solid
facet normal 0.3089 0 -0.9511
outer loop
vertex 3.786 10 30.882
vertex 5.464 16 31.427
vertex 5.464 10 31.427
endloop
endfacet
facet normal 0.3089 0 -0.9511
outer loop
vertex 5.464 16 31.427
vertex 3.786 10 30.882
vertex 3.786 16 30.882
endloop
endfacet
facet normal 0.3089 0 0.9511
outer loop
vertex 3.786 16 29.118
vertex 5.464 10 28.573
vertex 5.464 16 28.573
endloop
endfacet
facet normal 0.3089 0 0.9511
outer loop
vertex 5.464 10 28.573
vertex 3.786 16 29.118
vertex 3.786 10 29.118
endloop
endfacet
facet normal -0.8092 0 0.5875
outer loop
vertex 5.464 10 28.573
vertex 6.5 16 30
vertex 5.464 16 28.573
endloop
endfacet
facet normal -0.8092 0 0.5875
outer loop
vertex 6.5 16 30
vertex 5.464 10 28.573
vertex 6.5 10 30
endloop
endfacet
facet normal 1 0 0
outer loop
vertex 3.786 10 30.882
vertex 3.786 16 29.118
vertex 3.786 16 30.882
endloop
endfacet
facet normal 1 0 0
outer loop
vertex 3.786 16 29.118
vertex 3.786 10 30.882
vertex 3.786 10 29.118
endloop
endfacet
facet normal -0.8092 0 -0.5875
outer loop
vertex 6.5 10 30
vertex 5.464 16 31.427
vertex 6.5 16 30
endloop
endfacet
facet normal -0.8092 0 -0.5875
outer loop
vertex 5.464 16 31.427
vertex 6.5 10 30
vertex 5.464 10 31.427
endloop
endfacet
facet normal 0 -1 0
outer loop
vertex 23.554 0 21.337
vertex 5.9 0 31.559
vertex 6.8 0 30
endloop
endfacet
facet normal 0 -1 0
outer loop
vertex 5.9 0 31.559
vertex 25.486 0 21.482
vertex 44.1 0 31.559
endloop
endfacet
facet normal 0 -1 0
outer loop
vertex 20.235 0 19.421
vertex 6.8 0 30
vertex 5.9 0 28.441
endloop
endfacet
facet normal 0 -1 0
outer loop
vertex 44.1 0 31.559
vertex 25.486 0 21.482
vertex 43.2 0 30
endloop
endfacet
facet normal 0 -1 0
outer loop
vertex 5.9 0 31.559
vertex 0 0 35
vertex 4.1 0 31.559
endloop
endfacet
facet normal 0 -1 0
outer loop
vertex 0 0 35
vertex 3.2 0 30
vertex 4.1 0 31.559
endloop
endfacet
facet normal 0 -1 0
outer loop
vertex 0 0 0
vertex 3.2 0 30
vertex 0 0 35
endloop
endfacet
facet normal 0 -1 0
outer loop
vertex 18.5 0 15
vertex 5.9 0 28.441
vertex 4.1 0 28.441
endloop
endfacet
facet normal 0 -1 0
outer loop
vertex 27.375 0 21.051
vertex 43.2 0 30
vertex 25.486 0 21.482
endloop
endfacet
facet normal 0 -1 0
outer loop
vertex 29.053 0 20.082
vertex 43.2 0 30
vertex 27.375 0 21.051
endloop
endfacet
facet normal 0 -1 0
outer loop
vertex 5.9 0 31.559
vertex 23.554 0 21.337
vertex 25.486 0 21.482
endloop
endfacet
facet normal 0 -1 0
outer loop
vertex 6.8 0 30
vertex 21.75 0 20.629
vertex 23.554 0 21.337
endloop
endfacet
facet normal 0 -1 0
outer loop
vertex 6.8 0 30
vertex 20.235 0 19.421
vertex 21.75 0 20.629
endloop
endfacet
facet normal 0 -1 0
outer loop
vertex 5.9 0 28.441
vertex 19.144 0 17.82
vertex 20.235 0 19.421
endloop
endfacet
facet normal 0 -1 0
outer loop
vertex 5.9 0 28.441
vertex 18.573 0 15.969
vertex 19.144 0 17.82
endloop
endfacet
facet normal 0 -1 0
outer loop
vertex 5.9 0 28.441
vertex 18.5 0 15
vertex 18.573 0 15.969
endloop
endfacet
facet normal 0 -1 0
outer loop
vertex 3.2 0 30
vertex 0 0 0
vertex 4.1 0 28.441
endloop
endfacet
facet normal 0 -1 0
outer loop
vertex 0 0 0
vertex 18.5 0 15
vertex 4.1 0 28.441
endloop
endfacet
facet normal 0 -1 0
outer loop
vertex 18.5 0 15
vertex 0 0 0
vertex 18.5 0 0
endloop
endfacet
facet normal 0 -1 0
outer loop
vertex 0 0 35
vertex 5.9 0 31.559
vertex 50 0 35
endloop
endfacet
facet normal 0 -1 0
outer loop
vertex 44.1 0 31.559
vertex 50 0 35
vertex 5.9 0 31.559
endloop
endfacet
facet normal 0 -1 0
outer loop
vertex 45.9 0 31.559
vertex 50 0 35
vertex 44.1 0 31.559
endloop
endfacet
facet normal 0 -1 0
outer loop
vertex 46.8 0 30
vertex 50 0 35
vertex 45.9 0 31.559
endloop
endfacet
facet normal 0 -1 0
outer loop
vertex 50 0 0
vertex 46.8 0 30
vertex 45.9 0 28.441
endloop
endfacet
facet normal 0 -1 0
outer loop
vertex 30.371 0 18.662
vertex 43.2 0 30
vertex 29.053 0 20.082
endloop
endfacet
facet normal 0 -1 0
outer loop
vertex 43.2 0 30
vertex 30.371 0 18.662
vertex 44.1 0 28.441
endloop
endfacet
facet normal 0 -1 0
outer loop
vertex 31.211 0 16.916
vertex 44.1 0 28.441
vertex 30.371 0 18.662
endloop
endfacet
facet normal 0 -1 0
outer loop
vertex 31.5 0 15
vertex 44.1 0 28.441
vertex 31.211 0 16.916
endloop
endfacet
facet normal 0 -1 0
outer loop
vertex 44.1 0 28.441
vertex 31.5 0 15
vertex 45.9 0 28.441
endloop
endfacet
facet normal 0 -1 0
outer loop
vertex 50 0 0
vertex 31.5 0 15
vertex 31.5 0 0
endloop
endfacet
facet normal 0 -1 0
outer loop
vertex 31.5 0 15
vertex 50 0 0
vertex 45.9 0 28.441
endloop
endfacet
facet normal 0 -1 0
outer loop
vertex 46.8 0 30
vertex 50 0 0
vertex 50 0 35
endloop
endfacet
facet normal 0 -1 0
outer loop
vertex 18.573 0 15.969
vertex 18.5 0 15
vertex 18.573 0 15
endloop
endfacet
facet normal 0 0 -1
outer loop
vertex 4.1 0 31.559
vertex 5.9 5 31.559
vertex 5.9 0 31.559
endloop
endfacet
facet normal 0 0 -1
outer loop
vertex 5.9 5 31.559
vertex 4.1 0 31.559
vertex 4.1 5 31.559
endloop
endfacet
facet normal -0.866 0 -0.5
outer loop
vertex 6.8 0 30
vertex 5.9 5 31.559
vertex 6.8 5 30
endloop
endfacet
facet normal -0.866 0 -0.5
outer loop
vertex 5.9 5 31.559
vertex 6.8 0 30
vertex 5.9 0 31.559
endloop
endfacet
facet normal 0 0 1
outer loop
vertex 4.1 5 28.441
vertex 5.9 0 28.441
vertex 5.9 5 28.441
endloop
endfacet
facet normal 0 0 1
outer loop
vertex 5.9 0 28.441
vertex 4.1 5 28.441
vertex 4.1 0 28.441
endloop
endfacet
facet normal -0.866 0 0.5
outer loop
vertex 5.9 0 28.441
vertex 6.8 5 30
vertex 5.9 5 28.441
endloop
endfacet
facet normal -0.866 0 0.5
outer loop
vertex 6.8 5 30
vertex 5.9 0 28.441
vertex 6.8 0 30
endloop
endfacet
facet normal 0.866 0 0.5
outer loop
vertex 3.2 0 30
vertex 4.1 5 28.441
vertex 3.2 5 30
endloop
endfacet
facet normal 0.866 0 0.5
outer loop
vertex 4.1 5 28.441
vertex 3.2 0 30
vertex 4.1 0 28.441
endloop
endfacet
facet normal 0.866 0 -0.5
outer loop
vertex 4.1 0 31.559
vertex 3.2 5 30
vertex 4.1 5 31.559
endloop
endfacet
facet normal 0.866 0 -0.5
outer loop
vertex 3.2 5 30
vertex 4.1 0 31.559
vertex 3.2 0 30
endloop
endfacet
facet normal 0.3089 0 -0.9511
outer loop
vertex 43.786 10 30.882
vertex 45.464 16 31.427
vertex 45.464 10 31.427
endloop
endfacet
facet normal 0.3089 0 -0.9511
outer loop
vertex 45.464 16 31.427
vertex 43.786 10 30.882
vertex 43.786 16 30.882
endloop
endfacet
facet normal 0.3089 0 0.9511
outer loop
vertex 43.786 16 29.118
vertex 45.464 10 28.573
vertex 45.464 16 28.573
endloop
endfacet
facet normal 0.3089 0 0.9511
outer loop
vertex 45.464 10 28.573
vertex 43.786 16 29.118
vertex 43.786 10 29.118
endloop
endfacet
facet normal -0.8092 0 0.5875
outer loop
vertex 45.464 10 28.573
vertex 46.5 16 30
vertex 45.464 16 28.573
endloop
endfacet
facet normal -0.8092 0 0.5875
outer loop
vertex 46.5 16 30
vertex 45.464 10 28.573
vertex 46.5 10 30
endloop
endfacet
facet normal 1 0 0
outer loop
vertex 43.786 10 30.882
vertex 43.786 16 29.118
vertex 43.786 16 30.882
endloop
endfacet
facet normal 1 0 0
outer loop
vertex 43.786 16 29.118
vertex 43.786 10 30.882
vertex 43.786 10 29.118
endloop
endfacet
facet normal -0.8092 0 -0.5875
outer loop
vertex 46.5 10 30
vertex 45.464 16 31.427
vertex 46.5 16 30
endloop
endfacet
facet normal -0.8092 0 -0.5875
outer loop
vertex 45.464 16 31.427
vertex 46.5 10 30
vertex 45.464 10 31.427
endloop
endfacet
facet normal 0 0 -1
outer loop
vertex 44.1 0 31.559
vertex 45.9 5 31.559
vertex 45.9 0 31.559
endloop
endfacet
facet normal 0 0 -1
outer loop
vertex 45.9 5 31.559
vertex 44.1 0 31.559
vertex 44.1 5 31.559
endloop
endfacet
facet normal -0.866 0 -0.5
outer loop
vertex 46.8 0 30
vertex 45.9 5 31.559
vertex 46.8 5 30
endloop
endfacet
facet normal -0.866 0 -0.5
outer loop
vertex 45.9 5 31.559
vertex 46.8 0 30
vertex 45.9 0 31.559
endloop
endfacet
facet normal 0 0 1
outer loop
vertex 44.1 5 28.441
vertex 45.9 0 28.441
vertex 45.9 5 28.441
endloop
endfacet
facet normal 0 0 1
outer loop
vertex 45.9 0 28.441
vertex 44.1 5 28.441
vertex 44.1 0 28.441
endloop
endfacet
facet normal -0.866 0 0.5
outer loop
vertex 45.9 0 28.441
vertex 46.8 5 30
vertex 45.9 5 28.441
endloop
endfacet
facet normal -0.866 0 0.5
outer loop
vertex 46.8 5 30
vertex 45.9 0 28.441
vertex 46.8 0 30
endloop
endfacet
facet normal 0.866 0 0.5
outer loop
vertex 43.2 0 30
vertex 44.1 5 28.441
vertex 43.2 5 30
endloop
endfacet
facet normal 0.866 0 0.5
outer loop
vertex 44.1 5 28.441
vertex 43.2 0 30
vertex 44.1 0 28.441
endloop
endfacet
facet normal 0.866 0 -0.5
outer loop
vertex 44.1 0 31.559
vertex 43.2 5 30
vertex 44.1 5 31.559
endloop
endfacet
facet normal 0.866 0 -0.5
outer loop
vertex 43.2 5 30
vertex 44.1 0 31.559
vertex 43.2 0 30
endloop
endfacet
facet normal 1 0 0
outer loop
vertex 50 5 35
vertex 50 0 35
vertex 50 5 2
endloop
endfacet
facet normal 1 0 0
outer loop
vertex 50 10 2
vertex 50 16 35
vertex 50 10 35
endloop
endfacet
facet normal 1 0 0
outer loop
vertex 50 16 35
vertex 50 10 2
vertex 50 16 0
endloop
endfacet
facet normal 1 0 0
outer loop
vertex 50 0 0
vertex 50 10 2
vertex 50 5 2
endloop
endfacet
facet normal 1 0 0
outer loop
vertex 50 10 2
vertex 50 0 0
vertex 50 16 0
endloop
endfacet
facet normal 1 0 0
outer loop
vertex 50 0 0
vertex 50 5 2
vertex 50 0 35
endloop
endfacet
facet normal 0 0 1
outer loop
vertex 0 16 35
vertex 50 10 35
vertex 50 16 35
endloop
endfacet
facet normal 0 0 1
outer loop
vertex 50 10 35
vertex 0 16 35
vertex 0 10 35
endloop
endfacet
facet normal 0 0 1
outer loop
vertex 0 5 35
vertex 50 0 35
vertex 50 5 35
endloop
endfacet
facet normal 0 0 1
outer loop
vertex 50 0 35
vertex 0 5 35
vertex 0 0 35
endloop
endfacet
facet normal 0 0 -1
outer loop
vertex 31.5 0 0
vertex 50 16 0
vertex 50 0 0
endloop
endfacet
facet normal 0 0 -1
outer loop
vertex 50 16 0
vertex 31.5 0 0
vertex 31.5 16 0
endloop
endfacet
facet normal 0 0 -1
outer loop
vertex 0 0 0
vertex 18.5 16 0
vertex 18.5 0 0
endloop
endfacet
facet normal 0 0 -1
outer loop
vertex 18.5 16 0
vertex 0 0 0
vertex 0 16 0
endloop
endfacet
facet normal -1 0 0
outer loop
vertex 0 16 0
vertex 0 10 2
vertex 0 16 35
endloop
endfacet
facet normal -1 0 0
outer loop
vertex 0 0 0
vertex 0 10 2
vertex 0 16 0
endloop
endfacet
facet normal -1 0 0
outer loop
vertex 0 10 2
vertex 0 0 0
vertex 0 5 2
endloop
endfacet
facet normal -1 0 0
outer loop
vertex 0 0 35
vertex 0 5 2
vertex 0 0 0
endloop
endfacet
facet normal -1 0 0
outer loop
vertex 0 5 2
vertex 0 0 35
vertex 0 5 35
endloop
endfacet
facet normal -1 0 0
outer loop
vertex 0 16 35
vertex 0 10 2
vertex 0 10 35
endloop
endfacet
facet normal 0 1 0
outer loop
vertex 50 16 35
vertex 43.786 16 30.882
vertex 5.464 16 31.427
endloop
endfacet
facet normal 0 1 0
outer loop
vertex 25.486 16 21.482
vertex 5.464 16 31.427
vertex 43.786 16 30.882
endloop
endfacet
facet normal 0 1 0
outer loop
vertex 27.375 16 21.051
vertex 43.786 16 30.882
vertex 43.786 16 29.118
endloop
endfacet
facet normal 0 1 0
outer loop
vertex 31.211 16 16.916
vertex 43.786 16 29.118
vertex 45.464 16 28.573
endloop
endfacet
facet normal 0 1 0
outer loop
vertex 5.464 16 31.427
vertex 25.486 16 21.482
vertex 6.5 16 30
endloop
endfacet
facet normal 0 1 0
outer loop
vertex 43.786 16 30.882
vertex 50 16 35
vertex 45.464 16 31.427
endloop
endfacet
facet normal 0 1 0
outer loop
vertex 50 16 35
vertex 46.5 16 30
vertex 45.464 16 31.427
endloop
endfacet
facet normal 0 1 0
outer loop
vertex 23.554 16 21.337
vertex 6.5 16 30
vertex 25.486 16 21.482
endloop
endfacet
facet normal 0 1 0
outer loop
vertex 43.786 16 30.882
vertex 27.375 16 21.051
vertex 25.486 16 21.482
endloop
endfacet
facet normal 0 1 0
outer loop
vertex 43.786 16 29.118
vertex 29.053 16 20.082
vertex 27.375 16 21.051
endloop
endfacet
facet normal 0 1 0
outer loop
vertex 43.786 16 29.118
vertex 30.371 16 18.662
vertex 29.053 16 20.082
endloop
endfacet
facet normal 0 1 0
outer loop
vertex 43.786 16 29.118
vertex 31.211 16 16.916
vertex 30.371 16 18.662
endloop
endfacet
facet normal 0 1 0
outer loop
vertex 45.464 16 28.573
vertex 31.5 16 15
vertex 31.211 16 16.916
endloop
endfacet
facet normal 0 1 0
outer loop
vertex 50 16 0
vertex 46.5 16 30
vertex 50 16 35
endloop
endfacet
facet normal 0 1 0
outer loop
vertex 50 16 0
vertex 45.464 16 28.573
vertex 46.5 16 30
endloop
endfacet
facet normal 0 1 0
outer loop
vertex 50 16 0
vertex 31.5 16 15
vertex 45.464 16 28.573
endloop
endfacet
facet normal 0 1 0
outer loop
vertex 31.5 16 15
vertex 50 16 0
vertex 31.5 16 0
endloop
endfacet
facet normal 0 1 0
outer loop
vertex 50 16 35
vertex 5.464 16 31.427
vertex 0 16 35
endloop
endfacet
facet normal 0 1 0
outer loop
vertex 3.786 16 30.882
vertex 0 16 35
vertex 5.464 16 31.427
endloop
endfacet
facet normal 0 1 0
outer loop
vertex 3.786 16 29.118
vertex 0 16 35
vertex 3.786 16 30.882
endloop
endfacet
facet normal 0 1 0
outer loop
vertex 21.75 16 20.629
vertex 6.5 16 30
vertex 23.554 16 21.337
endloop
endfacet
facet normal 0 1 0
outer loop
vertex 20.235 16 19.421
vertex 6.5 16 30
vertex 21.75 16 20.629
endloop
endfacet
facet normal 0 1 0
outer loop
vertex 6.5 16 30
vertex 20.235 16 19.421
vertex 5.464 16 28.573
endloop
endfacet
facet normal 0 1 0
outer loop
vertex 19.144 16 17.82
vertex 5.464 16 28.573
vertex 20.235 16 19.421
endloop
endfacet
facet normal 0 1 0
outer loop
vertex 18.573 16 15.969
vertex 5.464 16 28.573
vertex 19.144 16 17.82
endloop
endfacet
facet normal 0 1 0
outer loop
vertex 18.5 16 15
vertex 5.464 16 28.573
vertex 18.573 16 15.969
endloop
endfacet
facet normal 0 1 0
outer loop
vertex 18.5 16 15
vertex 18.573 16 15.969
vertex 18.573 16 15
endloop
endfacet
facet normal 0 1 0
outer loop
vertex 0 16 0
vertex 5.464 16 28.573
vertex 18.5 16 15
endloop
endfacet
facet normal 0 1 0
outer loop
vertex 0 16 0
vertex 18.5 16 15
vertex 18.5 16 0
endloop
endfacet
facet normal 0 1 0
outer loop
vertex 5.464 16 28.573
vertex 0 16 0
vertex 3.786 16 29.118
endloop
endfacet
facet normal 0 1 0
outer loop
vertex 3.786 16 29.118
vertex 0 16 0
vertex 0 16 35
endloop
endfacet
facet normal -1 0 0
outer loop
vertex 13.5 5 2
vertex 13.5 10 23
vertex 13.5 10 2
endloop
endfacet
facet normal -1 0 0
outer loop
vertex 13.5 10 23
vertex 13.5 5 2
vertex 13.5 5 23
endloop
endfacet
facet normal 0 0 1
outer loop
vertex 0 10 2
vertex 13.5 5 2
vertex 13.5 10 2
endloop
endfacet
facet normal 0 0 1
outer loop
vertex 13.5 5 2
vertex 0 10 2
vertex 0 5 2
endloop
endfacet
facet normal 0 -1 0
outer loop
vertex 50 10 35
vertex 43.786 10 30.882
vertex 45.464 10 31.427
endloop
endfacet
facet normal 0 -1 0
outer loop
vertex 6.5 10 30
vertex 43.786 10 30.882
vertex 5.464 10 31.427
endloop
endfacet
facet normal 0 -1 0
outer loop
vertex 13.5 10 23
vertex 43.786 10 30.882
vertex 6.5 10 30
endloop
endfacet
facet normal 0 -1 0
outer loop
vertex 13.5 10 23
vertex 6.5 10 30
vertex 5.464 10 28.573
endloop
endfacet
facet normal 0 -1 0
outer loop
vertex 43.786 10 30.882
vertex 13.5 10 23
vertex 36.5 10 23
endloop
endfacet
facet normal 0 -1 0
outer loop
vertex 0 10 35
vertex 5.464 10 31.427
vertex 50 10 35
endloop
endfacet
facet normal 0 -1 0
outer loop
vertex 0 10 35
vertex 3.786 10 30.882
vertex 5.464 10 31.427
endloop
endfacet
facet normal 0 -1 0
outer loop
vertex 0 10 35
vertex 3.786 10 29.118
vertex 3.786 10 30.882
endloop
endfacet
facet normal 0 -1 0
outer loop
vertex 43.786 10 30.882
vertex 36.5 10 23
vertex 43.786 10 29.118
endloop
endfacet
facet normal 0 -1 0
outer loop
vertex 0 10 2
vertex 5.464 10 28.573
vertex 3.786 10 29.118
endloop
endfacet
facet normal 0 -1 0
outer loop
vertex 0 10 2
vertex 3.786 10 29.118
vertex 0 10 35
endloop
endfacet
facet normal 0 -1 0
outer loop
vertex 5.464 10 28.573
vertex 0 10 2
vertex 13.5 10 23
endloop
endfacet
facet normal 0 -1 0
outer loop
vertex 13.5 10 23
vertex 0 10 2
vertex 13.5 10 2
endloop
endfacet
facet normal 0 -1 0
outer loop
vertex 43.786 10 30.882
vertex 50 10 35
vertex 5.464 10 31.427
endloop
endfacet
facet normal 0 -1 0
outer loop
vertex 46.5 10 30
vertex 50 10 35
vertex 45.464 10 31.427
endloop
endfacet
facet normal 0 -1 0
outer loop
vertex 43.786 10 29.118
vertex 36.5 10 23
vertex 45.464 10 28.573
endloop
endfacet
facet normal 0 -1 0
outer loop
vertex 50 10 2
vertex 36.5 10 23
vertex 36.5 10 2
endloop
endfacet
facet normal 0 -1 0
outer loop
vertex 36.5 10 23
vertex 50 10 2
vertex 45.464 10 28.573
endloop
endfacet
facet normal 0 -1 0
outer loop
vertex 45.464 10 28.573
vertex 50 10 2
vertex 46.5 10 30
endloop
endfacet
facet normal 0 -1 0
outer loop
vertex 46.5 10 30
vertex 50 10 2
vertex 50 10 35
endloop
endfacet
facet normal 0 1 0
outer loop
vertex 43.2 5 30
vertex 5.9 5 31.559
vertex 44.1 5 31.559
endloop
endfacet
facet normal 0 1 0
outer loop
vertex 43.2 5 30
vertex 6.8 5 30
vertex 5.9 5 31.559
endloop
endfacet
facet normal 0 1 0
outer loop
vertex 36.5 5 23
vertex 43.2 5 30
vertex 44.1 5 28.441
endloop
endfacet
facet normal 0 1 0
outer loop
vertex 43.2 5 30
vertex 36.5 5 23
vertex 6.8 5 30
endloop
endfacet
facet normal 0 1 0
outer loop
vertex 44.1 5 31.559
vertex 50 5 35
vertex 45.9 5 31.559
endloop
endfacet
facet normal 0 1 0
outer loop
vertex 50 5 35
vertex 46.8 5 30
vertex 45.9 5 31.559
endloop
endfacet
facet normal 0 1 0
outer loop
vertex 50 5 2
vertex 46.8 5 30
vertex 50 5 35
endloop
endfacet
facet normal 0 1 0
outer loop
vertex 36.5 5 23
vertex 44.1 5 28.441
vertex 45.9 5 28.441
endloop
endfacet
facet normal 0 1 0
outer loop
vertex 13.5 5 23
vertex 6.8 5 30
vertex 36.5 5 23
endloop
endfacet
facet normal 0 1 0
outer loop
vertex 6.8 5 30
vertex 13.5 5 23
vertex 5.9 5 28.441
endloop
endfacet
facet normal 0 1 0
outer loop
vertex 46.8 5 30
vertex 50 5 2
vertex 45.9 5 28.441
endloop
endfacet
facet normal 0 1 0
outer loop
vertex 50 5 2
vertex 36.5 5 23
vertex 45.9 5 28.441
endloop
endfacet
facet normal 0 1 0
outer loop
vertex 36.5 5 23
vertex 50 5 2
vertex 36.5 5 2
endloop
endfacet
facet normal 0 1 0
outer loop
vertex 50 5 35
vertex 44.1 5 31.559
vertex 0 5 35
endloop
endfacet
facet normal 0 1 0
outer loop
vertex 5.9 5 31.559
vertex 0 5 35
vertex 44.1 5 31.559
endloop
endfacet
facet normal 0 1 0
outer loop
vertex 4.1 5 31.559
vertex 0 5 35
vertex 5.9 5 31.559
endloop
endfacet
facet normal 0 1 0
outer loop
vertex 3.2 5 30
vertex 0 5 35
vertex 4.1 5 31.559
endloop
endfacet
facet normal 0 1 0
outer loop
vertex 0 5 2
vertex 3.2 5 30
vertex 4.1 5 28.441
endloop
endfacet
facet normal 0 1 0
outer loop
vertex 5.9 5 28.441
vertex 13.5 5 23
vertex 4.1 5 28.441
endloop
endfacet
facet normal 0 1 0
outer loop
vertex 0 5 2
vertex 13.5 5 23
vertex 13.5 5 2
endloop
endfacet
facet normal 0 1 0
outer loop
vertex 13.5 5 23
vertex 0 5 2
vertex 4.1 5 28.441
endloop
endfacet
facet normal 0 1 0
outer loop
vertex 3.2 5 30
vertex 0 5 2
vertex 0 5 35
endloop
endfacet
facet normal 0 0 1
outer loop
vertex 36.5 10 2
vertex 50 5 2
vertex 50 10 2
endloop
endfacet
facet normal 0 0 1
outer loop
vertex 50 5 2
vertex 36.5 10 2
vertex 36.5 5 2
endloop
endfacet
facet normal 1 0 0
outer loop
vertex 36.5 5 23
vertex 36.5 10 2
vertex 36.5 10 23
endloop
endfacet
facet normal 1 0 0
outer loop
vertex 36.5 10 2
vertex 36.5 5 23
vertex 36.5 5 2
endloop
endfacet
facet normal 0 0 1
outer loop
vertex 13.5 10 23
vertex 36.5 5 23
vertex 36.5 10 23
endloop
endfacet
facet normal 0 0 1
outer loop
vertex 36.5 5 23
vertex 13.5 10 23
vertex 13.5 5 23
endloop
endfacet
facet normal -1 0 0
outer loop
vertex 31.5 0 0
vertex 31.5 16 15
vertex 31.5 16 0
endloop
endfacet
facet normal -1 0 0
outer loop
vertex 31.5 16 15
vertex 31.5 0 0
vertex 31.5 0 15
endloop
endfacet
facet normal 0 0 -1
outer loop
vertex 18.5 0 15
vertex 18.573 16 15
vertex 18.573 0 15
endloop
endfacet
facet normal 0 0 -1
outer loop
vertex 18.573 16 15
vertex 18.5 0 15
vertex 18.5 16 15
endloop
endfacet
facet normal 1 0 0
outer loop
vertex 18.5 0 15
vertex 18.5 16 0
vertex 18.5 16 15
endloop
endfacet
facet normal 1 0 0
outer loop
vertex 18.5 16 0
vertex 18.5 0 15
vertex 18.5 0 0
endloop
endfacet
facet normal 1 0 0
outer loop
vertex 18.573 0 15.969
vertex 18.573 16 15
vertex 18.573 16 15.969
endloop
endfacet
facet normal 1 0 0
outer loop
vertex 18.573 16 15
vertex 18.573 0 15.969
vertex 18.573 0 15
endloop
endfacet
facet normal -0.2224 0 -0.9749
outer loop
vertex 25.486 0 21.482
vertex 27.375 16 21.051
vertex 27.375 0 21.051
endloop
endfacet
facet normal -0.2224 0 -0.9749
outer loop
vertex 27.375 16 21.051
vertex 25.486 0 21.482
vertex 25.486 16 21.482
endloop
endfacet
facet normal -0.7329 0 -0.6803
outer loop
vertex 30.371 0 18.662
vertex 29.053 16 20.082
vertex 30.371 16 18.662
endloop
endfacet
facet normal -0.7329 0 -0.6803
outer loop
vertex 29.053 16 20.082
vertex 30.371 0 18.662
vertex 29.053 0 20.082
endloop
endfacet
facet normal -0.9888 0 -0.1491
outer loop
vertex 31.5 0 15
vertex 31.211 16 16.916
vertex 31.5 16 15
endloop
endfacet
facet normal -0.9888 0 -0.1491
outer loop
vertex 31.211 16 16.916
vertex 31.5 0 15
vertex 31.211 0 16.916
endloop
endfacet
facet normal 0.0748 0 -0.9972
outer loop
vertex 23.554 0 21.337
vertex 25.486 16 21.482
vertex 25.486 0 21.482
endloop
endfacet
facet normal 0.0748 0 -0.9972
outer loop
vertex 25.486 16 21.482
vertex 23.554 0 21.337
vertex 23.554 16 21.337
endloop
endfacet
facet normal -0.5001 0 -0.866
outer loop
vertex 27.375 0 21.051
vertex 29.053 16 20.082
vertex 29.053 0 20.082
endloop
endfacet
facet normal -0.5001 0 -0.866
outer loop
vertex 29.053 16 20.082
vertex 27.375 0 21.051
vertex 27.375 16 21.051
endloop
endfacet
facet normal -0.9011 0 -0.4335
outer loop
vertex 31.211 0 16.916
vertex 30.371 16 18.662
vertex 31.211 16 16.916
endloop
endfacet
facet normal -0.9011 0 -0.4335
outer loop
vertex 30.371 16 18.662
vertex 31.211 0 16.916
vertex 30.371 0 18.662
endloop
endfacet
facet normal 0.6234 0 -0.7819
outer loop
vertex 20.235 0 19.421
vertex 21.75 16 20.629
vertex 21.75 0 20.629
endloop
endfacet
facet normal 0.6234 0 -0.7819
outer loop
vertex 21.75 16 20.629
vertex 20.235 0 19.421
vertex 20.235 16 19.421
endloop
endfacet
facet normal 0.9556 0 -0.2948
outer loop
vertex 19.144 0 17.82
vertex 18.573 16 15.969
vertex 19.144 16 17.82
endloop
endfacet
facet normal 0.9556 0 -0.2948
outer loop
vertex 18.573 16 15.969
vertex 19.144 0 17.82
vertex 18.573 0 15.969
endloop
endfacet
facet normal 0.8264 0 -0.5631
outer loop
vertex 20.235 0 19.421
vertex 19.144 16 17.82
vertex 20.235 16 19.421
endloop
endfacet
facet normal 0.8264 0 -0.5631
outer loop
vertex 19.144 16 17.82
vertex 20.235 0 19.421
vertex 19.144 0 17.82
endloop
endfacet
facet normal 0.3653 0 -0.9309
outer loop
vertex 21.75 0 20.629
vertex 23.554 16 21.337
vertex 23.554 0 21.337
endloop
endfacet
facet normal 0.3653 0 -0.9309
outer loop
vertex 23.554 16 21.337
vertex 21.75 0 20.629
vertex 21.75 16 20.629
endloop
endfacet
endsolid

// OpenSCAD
slot = 13;

difference() {
    cube([50,16,35]);
    translate([0,5,2]) {
        cube([(50-slot)/2-5,5,33]);
    }
    translate([(50+slot)/2 + 5,5,2]) {
        cube([(50-slot)/2-5,5,33]);
    }
    translate([0,5,21+2]) {
        cube([50,5,12]);
    }
    translate([(50-slot)/2, 0, 0]) {
        cube([slot,16,15]);
    }
    
    translate([(50/2), 0, 15]) {
        rotate([270,0,0]) {
            cylinder(r=slot/2,h=16);
        }
    }
    translate([5, 0, 30]) {
        rotate([270,0,0]) {
            cylinder(r=1.5,h=17);
            cylinder(r=1.8,h=8);
        }
    }
    translate([45, 0, 30]) {
        rotate([270,0,0]) {
            cylinder(r=1.5,h=17);
            cylinder(r=1.8,h=8);
        }
    }
}
